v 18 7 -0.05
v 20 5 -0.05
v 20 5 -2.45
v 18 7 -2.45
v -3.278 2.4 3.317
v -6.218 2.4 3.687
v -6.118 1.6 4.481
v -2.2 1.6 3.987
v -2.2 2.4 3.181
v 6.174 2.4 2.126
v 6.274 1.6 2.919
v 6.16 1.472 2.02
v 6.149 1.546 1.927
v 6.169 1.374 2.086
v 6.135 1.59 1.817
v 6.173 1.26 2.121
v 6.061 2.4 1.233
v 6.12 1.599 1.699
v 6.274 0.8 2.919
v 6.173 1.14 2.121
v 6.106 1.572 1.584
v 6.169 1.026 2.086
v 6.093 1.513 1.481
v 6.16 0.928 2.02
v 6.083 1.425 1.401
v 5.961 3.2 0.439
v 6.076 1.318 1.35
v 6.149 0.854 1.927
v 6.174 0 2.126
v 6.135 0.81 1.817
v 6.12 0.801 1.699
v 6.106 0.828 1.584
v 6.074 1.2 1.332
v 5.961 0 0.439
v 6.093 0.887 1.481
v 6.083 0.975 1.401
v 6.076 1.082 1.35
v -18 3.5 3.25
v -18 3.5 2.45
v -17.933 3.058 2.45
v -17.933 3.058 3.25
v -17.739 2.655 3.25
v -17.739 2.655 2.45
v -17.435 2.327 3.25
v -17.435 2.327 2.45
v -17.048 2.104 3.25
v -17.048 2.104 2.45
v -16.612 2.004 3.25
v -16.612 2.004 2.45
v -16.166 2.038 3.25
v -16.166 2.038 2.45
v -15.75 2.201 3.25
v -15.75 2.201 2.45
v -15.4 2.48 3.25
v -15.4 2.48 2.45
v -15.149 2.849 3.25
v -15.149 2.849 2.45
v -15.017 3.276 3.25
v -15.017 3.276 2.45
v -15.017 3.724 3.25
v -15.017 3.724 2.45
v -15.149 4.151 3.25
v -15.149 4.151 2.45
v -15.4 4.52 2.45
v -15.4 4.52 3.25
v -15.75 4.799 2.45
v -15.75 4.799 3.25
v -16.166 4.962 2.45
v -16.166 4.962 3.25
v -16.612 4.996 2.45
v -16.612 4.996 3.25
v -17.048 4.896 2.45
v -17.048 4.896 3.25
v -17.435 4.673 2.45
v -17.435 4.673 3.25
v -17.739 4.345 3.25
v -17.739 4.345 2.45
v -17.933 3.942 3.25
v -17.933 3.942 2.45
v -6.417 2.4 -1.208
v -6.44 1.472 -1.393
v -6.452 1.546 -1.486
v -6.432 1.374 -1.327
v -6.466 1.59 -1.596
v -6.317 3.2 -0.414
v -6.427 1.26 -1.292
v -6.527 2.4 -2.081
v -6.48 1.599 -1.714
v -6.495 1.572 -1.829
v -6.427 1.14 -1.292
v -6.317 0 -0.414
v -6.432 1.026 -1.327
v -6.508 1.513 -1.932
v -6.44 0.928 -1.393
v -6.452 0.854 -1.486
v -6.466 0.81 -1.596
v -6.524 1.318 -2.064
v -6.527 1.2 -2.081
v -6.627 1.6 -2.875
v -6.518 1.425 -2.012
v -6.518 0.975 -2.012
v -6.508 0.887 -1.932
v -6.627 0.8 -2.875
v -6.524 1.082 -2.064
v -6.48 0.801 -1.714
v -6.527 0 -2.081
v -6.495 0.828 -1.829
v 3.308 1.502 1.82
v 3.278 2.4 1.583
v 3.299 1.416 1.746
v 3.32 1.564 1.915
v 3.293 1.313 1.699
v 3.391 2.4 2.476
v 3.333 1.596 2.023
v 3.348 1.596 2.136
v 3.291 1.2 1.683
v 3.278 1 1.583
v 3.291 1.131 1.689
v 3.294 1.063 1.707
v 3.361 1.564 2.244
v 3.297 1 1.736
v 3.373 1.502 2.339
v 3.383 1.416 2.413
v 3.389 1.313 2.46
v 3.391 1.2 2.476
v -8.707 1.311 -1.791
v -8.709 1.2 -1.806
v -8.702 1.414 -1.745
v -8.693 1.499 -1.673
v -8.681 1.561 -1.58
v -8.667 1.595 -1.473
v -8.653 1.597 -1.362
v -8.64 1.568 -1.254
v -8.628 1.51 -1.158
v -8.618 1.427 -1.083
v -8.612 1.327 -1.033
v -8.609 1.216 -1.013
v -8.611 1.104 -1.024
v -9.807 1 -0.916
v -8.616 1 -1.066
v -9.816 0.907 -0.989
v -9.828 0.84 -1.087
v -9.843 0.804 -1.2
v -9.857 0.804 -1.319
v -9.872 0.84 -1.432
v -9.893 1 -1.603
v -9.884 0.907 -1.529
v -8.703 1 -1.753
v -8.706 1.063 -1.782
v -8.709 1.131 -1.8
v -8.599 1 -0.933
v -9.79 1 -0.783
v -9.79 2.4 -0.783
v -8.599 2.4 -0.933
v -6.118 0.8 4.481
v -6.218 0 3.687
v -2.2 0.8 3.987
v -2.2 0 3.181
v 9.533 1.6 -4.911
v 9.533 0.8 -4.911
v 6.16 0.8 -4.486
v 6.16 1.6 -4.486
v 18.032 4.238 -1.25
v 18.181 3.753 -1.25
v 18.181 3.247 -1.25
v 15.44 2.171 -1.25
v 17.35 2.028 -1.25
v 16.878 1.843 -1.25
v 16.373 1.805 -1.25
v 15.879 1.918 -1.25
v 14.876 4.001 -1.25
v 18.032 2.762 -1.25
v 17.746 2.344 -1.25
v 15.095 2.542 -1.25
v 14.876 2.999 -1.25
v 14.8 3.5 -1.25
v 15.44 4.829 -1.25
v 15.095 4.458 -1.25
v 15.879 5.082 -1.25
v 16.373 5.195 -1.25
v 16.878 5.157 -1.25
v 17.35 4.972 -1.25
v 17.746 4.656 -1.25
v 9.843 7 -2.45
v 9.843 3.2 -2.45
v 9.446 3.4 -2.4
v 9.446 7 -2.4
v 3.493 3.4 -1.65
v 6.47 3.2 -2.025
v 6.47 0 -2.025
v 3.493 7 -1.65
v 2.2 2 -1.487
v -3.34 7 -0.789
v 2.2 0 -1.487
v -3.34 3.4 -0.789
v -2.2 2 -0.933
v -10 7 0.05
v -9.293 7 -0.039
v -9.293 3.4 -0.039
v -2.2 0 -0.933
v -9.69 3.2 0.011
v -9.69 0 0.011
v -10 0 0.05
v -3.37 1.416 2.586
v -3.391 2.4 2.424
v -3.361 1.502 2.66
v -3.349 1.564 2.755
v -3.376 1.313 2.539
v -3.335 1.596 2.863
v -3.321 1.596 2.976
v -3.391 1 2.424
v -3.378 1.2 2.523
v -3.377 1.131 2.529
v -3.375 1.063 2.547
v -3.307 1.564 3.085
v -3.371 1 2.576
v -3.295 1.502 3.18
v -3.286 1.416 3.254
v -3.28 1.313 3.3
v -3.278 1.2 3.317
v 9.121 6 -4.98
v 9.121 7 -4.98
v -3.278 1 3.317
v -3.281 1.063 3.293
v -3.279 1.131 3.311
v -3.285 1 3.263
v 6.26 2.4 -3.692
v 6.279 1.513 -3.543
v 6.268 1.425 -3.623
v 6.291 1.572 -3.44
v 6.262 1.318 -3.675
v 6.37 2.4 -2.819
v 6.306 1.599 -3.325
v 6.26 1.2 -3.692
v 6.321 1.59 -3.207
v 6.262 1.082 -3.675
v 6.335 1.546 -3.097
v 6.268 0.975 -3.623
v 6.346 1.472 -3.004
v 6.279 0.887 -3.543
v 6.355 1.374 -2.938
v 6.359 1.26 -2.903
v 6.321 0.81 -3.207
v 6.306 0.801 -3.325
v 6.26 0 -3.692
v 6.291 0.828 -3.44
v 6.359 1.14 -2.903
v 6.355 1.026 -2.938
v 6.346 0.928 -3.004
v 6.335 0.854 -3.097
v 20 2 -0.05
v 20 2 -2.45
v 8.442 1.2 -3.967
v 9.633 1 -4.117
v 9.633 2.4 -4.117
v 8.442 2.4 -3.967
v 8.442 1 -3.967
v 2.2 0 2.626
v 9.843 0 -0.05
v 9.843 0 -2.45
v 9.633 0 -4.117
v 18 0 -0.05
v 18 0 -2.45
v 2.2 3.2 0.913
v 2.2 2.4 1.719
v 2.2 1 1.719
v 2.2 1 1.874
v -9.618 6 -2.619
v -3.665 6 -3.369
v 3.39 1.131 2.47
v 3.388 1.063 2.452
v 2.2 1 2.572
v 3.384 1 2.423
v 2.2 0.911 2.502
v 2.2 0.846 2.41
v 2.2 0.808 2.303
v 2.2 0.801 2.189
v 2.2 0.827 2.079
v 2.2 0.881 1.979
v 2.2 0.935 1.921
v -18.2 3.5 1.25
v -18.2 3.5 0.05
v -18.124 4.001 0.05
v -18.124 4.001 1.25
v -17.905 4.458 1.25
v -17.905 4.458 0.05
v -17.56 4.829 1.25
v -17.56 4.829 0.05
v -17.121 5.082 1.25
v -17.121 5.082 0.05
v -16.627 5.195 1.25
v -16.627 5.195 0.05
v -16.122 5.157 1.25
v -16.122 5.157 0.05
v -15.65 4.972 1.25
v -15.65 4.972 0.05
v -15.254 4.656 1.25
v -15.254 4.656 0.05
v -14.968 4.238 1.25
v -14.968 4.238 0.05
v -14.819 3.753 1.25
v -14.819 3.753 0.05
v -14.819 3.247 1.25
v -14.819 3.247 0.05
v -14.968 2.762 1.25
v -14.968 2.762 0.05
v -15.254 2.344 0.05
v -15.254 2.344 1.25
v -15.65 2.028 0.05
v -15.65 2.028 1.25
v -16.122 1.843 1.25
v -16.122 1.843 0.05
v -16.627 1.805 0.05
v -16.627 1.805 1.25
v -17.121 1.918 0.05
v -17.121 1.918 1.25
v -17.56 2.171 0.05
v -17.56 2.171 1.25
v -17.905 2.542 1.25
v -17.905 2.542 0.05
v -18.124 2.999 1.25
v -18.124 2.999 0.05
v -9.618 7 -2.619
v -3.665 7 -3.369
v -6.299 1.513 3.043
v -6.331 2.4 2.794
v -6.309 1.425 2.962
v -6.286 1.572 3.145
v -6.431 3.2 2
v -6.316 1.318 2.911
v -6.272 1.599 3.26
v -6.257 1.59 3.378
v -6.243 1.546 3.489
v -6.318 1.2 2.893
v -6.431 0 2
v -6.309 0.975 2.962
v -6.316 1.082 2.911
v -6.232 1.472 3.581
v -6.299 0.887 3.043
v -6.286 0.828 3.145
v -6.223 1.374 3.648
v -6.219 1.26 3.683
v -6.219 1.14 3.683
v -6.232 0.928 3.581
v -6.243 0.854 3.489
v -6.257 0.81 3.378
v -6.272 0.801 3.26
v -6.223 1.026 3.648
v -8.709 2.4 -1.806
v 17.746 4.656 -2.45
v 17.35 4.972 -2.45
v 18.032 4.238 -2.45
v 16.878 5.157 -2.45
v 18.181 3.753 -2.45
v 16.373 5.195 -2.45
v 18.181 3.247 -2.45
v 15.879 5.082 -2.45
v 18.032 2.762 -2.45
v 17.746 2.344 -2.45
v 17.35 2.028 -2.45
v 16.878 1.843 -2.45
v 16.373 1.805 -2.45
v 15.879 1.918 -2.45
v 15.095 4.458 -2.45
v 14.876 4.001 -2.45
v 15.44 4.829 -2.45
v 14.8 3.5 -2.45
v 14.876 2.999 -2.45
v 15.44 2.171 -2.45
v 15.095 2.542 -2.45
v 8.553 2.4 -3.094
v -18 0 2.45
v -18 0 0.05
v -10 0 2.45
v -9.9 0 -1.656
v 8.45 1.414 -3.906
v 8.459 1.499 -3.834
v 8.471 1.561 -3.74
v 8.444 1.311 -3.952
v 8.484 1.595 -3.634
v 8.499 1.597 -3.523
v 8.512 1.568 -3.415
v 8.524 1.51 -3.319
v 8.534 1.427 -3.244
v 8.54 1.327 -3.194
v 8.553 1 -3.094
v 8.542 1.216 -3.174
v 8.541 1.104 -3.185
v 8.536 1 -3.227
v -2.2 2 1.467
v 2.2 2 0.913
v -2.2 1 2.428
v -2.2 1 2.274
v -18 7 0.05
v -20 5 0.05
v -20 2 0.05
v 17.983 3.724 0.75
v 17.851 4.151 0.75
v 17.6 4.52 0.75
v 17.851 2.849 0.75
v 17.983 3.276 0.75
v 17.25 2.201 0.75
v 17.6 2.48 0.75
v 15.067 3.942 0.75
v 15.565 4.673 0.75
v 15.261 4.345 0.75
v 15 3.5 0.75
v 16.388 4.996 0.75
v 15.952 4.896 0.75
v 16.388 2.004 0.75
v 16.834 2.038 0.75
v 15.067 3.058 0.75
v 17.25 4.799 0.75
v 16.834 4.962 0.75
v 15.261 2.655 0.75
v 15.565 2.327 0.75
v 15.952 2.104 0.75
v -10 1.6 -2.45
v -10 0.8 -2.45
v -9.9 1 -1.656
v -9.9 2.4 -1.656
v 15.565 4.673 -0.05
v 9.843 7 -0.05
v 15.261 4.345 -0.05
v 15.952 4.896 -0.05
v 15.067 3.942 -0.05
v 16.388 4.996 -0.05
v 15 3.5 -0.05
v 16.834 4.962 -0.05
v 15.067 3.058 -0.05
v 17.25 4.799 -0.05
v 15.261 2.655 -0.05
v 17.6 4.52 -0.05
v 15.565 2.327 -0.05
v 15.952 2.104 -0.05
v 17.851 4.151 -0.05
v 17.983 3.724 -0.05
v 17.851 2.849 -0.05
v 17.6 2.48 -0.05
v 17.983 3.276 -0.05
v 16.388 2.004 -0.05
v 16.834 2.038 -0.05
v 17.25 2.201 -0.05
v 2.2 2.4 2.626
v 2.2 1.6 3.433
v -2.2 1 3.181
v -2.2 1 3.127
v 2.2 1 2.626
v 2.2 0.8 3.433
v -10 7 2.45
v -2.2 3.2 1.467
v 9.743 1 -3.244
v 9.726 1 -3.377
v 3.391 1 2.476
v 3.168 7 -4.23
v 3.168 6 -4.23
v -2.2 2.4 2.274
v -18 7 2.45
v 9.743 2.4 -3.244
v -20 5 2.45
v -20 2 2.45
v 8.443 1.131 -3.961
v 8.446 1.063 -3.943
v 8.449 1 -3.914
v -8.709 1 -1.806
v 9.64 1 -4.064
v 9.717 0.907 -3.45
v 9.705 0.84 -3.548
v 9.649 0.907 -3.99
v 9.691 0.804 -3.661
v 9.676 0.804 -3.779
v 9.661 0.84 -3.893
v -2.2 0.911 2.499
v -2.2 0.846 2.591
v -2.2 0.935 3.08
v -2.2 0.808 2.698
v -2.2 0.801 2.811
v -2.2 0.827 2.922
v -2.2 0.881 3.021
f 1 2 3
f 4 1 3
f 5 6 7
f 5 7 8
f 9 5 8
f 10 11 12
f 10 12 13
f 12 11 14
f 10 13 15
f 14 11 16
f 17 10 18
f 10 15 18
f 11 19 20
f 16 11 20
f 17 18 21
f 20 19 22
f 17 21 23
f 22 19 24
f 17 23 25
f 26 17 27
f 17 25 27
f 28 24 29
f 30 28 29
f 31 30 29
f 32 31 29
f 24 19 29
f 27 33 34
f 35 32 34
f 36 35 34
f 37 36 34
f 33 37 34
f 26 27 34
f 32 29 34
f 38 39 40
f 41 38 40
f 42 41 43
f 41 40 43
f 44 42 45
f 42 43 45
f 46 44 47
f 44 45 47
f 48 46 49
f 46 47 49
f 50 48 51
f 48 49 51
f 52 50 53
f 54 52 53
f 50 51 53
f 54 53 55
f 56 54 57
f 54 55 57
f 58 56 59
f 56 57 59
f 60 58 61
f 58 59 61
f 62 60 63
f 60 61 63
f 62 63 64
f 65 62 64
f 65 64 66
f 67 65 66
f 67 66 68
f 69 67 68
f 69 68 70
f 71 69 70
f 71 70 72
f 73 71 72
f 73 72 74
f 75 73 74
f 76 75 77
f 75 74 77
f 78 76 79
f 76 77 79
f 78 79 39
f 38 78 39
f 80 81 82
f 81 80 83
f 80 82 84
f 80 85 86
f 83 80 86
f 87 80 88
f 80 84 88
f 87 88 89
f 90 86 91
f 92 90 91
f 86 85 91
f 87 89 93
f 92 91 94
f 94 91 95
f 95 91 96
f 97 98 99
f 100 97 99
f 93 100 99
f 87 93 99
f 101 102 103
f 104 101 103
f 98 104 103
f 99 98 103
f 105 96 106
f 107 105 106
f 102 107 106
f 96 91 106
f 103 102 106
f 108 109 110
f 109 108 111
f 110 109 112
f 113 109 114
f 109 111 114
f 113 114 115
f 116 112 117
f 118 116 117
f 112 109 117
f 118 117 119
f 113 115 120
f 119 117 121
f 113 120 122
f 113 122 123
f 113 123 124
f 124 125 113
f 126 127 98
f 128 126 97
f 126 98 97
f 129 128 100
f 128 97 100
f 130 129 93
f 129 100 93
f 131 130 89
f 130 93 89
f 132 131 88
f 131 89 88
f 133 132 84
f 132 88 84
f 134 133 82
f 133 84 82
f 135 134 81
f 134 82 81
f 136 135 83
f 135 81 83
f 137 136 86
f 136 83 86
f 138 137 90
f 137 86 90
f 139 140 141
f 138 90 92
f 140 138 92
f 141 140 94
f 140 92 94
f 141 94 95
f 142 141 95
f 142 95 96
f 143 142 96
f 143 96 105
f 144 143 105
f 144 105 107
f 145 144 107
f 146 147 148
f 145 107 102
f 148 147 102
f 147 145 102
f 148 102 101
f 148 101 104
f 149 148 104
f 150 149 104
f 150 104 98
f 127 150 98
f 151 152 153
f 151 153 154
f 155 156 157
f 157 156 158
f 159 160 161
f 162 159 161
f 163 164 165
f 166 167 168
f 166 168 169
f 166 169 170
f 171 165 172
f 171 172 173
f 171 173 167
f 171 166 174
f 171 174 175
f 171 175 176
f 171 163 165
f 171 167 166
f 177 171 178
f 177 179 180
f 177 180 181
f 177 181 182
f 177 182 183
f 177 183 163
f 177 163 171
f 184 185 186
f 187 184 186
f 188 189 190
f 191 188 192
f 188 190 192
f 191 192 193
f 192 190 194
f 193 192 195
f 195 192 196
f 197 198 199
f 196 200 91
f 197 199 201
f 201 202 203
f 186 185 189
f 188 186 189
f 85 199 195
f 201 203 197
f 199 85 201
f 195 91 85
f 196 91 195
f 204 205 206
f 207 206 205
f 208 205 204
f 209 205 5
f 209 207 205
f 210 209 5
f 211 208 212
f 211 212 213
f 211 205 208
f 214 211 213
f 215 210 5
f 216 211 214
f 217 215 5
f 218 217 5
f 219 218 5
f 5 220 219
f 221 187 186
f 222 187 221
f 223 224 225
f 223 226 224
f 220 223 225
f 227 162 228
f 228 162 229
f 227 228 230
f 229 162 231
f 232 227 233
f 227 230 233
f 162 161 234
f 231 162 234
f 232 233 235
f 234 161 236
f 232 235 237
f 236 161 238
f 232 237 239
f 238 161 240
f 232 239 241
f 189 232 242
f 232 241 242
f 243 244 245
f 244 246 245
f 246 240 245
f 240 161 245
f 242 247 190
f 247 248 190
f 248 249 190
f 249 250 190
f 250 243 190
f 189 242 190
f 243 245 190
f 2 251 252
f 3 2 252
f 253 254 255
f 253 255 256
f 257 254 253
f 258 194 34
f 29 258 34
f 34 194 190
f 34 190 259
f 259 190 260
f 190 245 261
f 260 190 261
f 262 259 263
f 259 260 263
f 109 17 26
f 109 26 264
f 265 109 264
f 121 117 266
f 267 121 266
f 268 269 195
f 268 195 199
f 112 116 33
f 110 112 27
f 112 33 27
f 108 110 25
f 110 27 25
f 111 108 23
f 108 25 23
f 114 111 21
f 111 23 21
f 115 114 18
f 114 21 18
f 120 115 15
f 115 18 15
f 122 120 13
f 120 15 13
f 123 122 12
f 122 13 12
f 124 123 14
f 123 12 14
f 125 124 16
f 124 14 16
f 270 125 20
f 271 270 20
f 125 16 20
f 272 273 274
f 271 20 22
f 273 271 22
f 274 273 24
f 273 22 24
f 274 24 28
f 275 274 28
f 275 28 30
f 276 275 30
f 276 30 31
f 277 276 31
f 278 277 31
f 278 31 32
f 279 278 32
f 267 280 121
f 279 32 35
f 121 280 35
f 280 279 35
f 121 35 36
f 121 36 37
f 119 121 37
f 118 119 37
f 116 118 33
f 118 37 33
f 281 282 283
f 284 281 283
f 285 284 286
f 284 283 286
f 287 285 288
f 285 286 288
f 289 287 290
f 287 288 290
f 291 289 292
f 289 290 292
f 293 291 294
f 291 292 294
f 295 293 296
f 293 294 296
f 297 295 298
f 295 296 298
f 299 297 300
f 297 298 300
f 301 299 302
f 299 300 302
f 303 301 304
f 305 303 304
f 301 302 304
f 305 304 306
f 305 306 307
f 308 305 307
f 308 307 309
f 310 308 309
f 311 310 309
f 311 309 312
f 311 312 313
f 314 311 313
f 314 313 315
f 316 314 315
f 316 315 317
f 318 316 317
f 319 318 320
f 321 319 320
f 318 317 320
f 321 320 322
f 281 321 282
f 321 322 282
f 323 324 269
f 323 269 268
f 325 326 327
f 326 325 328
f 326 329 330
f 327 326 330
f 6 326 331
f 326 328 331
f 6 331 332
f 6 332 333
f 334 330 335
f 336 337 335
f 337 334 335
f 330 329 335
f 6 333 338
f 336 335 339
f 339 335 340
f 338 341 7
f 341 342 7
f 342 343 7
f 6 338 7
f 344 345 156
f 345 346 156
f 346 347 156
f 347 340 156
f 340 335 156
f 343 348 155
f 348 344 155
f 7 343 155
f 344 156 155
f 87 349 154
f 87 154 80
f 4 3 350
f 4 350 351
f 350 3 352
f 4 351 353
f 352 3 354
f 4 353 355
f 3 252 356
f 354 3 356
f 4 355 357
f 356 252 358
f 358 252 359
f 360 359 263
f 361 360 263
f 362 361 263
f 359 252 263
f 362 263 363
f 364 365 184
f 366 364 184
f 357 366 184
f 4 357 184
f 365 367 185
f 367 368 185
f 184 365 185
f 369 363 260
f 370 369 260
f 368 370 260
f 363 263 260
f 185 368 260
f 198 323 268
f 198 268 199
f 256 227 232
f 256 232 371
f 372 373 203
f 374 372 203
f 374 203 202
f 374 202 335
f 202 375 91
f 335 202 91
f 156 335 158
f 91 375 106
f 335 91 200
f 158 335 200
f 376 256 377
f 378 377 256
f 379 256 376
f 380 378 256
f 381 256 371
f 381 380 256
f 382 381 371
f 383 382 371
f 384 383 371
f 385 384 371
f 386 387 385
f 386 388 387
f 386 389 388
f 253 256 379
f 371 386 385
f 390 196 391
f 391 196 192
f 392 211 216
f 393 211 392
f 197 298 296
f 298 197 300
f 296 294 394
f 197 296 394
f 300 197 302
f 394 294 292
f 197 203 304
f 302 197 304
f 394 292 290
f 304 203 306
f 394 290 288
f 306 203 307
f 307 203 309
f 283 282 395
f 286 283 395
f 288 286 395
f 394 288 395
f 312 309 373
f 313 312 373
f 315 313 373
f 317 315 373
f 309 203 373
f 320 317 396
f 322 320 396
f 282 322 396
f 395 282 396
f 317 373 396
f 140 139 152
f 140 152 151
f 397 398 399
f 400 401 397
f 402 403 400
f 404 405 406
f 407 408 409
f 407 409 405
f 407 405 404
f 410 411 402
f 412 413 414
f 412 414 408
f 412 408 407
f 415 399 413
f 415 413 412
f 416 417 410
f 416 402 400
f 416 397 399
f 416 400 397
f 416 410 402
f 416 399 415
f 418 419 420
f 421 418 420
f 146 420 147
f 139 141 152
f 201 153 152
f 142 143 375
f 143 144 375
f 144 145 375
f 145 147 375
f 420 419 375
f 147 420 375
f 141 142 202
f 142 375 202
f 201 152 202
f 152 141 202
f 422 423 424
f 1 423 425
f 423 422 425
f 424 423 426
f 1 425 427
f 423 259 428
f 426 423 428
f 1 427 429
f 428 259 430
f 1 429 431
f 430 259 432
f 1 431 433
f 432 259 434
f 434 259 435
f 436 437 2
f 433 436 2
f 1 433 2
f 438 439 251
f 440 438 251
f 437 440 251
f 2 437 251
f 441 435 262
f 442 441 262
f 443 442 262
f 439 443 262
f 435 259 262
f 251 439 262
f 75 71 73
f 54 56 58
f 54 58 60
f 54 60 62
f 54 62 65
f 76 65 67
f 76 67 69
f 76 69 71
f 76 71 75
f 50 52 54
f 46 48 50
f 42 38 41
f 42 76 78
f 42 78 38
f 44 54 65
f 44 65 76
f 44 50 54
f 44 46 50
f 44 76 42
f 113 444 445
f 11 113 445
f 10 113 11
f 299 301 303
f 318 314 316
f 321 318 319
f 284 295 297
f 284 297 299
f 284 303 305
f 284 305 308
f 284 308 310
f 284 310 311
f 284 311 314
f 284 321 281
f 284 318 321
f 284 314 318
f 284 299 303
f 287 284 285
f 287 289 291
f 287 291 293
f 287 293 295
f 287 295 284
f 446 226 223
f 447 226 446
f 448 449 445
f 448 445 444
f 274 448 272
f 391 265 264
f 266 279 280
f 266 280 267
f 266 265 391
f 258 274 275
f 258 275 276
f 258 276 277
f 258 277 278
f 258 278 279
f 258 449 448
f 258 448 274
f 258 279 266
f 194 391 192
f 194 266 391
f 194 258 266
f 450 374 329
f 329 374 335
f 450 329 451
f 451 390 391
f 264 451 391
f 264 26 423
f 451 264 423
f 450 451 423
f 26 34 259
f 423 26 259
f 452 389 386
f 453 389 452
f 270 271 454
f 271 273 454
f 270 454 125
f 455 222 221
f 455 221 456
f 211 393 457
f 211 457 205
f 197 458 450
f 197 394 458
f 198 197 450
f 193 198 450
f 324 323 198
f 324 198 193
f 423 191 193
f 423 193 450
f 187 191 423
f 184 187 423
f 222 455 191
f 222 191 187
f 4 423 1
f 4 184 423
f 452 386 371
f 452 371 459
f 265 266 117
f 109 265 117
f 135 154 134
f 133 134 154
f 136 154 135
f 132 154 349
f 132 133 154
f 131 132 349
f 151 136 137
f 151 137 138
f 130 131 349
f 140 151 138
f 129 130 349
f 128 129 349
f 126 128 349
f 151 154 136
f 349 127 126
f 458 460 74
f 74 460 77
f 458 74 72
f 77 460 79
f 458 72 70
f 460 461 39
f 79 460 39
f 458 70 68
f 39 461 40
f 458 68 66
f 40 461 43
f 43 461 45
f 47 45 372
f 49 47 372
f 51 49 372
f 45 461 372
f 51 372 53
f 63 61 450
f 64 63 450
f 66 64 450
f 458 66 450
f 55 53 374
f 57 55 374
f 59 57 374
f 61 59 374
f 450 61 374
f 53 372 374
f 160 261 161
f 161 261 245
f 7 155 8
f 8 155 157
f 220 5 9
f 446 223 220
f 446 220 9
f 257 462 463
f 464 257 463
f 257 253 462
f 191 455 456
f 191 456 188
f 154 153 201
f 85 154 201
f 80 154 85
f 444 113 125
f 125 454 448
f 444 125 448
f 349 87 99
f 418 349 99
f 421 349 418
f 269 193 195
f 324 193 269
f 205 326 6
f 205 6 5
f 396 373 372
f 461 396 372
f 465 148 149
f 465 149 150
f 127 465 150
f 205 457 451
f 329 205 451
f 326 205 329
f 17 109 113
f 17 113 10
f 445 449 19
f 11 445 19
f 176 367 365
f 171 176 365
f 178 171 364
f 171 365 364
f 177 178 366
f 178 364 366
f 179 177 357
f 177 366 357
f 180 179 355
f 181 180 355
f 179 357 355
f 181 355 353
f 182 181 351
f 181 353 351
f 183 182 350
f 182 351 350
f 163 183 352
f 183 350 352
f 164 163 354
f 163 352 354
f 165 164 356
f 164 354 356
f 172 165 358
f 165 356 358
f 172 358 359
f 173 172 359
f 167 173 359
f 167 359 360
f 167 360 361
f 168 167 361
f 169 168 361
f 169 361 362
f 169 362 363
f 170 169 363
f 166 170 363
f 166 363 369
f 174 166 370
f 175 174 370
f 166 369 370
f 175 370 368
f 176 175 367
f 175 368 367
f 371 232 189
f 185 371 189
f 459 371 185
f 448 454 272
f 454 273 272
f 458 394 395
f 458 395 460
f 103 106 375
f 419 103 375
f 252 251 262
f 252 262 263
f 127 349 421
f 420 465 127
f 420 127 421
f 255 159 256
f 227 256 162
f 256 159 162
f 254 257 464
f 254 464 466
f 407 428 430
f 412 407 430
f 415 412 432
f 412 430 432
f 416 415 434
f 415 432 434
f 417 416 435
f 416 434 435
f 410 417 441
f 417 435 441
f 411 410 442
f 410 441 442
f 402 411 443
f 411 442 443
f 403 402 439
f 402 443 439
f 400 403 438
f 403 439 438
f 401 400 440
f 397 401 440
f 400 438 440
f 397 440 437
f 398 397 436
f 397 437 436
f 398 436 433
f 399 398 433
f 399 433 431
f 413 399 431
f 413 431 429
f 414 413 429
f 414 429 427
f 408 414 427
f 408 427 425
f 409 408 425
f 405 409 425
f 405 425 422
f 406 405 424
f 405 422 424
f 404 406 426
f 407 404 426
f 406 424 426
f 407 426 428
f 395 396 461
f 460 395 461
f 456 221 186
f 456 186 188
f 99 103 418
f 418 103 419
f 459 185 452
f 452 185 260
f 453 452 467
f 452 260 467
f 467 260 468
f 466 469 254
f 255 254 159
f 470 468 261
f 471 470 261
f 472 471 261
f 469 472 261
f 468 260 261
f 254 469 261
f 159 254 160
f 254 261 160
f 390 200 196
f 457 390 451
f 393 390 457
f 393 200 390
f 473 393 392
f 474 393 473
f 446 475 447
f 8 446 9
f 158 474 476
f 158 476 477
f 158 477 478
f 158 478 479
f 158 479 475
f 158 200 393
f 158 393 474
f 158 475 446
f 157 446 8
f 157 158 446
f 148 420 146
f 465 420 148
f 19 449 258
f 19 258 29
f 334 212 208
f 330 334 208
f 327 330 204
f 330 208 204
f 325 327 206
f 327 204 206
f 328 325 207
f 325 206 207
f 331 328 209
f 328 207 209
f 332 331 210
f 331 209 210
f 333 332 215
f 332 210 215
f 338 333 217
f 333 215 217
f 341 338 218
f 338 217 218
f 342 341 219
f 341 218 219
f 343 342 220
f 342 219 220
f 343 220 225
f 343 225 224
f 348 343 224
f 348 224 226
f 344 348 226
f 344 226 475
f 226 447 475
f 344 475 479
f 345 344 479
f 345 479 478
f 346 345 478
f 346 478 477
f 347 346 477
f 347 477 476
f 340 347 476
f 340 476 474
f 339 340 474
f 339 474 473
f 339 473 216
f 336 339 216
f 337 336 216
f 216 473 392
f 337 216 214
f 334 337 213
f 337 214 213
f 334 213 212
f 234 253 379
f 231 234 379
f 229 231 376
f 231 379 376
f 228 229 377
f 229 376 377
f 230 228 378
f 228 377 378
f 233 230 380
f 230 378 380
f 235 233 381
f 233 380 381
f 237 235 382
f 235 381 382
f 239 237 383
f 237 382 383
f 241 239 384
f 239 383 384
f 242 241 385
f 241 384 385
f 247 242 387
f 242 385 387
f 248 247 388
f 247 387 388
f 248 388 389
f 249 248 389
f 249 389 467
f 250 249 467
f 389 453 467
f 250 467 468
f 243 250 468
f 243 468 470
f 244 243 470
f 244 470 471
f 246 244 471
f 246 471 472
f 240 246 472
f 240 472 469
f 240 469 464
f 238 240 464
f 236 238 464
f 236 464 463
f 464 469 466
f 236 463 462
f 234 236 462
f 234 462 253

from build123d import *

# Parameters (mm, degrees)
BOSS_EXTRUDE4_DEPTH      = 2.4
BOSS_EXTRUDE4_2_DEPTH    = 2.4
BOSS_EXTRUDE4_3_DEPTH    = 2.4
BOSS_EXTRUDE4_4_DEPTH    = 2.4
BOSS_EXTRUDE5_DEPTH      = 7
SKETCH2_R                = 1.499999999999997
BOSS_EXTRUDE8_DEPTH      = 0.8
SKETCH3_R                = 1.5000000000000007
BOSS_EXTRUDE9_DEPTH      = 0.8
SKETCH4_R                = 1.6999999999999995
CUT_EXTRUDE3_DEPTH       = 1.2
SKETCH5_R                = 1.6999999999999995
CUT_EXTRUDE4_DEPTH       = 1.2
CHAMFER4_SIZE            = 2
CUT_EXTRUDE7_REACH       = 33.329
SKETCH8_R                = 0.3999999999999905
SKETCH8_R_2              = 0.4000000000000032
CUT_EXTRUDE10_DEPTH      = 2
CHAMFER6_SIZE            = 0.8
CUT_EXTRUDE11_DEPTH      = 10
CUT_EXTRUDE11_DEPTH_BACK = 1.4
BOSS_EXTRUDE10_DEPTH     = 3.6
CHAMFER8_SIZE            = 2.6


with BuildPart() as part:
    # Sketch1 → Boss-Extrude4 (new body)
    with BuildSketch(Plane(origin=(0, 0, 0), x_dir=(1, 0, 0), z_dir=(0, 1, 0))):
        Polygon((-6.430686748297487, -2.000308799271804), (-6.118186748297487, -4.480700653394857), (-2.1999999999999993, -3.9870555235708633), (-2.1999999999999997, -1.4672923701760037), align=None)
    extrude(amount=BOSS_EXTRUDE4_DEPTH)



with BuildPart() as body_2:
    # Sketch1 → Boss-Extrude4 2 (new body)
    with BuildSketch(Plane(origin=(0, 0, 0), x_dir=(1, 0, 0), z_dir=(0, 1, 0))):
        Polygon((-10.000000000000064, 2.4499999999999993), (-9.689951018234682, -0.01093750000000027), (-6.316618096627332, 0.41406249999999967), (-6.626667078392713, 2.8750000000000004), align=None)
    extrude(amount=BOSS_EXTRUDE4_2_DEPTH)


with BuildPart() as body_3:
    # Sketch1 → Boss-Extrude4 3 (new body)
    with BuildSketch(Plane(origin=(0, 0, 0), x_dir=(1, 0, 0), z_dir=(0, 1, 0))):
        Polygon((5.961321581281771, -0.4390625000000079), (2.200000000000001, -0.9129444764291388), (2.200000000000001, -3.432707629823996), (6.273821581281774, -2.919454354123064), align=None)
    extrude(amount=BOSS_EXTRUDE4_3_DEPTH)


with BuildPart() as body_4:
    # Sketch1 → Boss-Extrude4 4 (new body)
    with BuildSketch(Plane(origin=(0, 0, 0), x_dir=(1, 0, 0), z_dir=(0, 1, 0))):
        Polygon((6.159752929611616, 4.485937500000006), (6.469801911377001, 2.025000000000001), (9.843134832984354, 2.4499999999999993), (9.533085851218969, 4.910937500000012), align=None)
    extrude(amount=BOSS_EXTRUDE4_4_DEPTH)


with BuildPart() as part_1:
    add(part.part)

    add(body_2.part)  # Boss-Extrude5 merges body 2

    add(body_3.part)  # Boss-Extrude5 merges body 3

    add(body_4.part)  # Boss-Extrude5 merges body 4
    # Sketch1<8> → Boss-Extrude5 (add)
    with BuildSketch(Plane(origin=(0, 0, 0), x_dir=(1, 0, 0), z_dir=(0, 1, 0))):
        Polygon((-20, -0.05000000000000027), (-20, -2.45), (-12, -2.4499999999999997), (-10.000000000000064, -2.4499999999999997), (-6.430686748297488, -2.000308799271796), (-2.5125, -1.5066636694477982), (-2.1999999999999993, -1.467292370176004), (-2.1999999999999997, 0.9327076298239989), (-6.316618096627332, 0.41406249999999967), (-9.689951018234682, -0.01093750000000025), (-10.000000000000064, -0.05000000000000029), (-12, -0.05000000000000027), align=None)
        Polygon((2.2000000000000006, 1.487055523570866), (2.2000000000000006, -0.9129444764291423), (5.961321581281771, -0.4390625000000079), (9.687500000000064, 0.03039185412306233), (9.843134832984425, 0.05000000000000027), (12, 0.05000000000000013), (20, 0.05000000000000013), (20, 2.4499999999999997), (12, 2.4499999999999993), (9.843134832984353, 2.4499999999999993), (6.469801911376997, 2.024999999999999), (2.510048981765383, 1.526118023570866), align=None)
        Polygon((-2.1999999999999997, 0.9327076298239989), (-2.1999999999999997, -1.4672923701760037), (2.200000000000001, -0.9129444764291388), (2.2000000000000006, 1.487055523570866), align=None)
    extrude(amount=BOSS_EXTRUDE5_DEPTH)

    # Sketch2 → Boss-Extrude8 (add)
    with BuildSketch(Plane.XY.offset(2.4499999999999993)):
        with Locations(Location((-16.5, 3.4999999999999996, 0), (0, 0, 180))):
            Circle(SKETCH2_R)
    extrude(amount=BOSS_EXTRUDE8_DEPTH)

    # Sketch3 → Boss-Extrude9 (add)
    with BuildSketch(Plane.XY.offset(-0.05000000000000013)):
        with Locations(Location((16.5, 3.4999999999999996, 0), (0, 0, 180))):
            Circle(SKETCH3_R)
    extrude(amount=BOSS_EXTRUDE9_DEPTH)

    # Sketch4 → Cut-Extrude3 (cut)
    with BuildSketch(Plane(origin=(0, 0, 0.05000000000000041), x_dir=(-1, 0, -5e-17), z_dir=(5e-17, 0, -1))):
        with Locations((16.5, 3.4999999999999996)):
            Circle(SKETCH4_R)
    extrude(amount=-CUT_EXTRUDE3_DEPTH, mode=Mode.SUBTRACT)

    # Sketch5 → Cut-Extrude4 (cut)
    with BuildSketch(Plane(origin=(-1e-16, 0, -2.449999999999999), x_dir=(-1, 0, 5e-17), z_dir=(-5e-17, 0, -1))):
        with Locations((-16.5, 3.4999999999999996)):
            Circle(SKETCH5_R)
    extrude(amount=-CUT_EXTRUDE4_DEPTH, mode=Mode.SUBTRACT)

    # Chamfer4
    chamfer4_edges = [part_1.edges().sort_by_distance(p)[0] for p in [
        (20, 7, -1.25),
        (-20, 7, 1.2500000000000002),
        (-20, 0, 1.2500000000000002),
        (20, 0, -1.25),
    ]]
    chamfer(chamfer4_edges, length=CHAMFER4_SIZE)

    # Cut-Extrude7: up to this face of the body (flat: up to its plane)
    cut_extrude7_end = Plane(part_1.part.faces().sort_by_distance((-9.844975509, 1.2, -1.21953125))[0])
    # Sketch8 → Cut-Extrude7 (cut, up to the picked face)
    with BuildSketch(Plane(origin=(9.99318385334905, 0, -1.2590228229384695), x_dir=(-0.12500000000000053, 0, -0.9921567416492215), z_dir=(0.9921567416492215, 0, -0.12500000000000053)), mode=Mode.PRIVATE) as cut_extrude7_sk1:
        with Locations((2.4807840170405906, 1.2000000000000017)):
            Circle(SKETCH8_R)
    cut_extrude7_tool1 = split(extrude(cut_extrude7_sk1.sketch, amount=-CUT_EXTRUDE7_REACH, mode=Mode.PRIVATE), bisect_by=cut_extrude7_end, keep=Keep.BOTH, mode=Mode.PRIVATE)
    # Sketch8 → Cut-Extrude7 (cut, up to the picked face)
    with BuildSketch(Plane(origin=(9.99318385334905, 0, -1.2590228229384695), x_dir=(-0.12500000000000053, 0, -0.9921567416492215), z_dir=(0.9921567416492215, 0, -0.12500000000000053)), mode=Mode.PRIVATE) as cut_extrude7_sk2:
        with Locations((-2.4807840170405973, 1.200000000000001)):
            Circle(SKETCH8_R_2)
    cut_extrude7_tool2 = split(extrude(cut_extrude7_sk2.sketch, amount=-CUT_EXTRUDE7_REACH, mode=Mode.PRIVATE), bisect_by=cut_extrude7_end, keep=Keep.BOTH, mode=Mode.PRIVATE)
    add(cut_extrude7_tool1.solids().sort_by(Axis((9.683086, 1.2, -3.720349), (-0.9921567416492215, 0, 0.12500000000000053)))[0], mode=Mode.SUBTRACT)
    add(cut_extrude7_tool2.solids().sort_by(Axis((10.303282, 1.2, 1.202304), (-0.9921567416492215, 0, 0.12500000000000053)))[0], mode=Mode.SUBTRACT)

    # Sketch1<10> → Cut-Extrude10 (cut)
    with BuildSketch(Plane(origin=(0, 0, 0), x_dir=(1, 0, 0), z_dir=(0, 1, 0))):
        Polygon((-2.1999999999999997, 0.9327076298239989), (-2.1999999999999997, -1.4672923701760037), (2.200000000000001, -0.9129444764291388), (2.2000000000000006, 1.487055523570866), align=None)
        Polygon((-2.2, 3.432707629823986), (-2.1999999999999997, 0.9327076298239989), (2.200000000000001, 1.487055523570866), (2.2, 3.987055523570867), align=None)
        Polygon((2.200000000000001, -0.9129444764291388), (-2.1999999999999993, -1.467292370176004), (-2.1999999999999993, -3.9870555235708607), (2.200000000000003, -3.432707629823997), align=None)
    extrude(amount=CUT_EXTRUDE10_DEPTH, mode=Mode.SUBTRACT)

    # Chamfer6
    chamfer6_edges = [part_1.edges().sort_by_distance(p)[0] for p in [
        (4.080660790640886, 2.4, 0.6760034882145733),
        (-4.315343374148743, 2.4, 1.7338005847239037),
        (-4.159093374148743, 0, 4.233878088482863),
        (-4.159093374148743, 2.4, 4.233878088482863),
        (7.846419390415299, 2.4, -4.698437499999993),
        (8.156468372180676, 2.4, -2.237499999999999),
        (7.846419390415299, 0, -4.698437499999993),
        (4.236910790640888, 2.4, 3.1760809919735298),
        (-8.313333539196389, 2.4, -2.6624999999999988),
        (-8.003284557431007, 2.4, -0.20156249999999976),
        (-8.313333539196389, 0, -2.6624999999999988),
        (4.236910790640888, 0, 3.1760809919735298),
    ]]
    chamfer(chamfer6_edges, length=CHAMFER6_SIZE)

    # Sketch9 → Cut-Extrude11 (cut, two sides: drawn at the far end of the back side and taken through both)
    with BuildSketch(Plane(origin=(0, 2.4, 0), x_dir=(1, 0, 0), z_dir=(0, 1, 0)).offset(-CUT_EXTRUDE11_DEPTH_BACK)):
        Polygon((-9.900000000000063, 1.6562746066806198), (-9.789951018234682, 0.7827878933193786), (-8.599362928255616, 0.9327878933193787), (-8.709411910020998, 1.8062746066806201), align=None)
        Polygon((-2.1999999999999993, -2.2736165792623466), (-3.390588089979065, -2.423616579262345), (-3.2780880899790614, -3.3165576467466713), (-2.087499999999996, -3.1665576467466714), align=None)
        Polygon((2.200000000000001, -2.626383420737649), (2.087499999999998, -1.733442353253328), (3.278088089979064, -1.5834423532533284), (3.3905880899790666, -2.47638342073765), align=None)
        Polygon((9.633085851218974, 4.117212106680604), (8.442497761239908, 3.967212106680604), (8.552546743005287, 3.0937253933193816), (9.743134832984353, 3.2437253933193815), align=None)
    extrude(amount=CUT_EXTRUDE11_DEPTH + CUT_EXTRUDE11_DEPTH_BACK, mode=Mode.SUBTRACT)

    # Sketch10 → Boss-Extrude10 (add)
    with BuildSketch(Plane(origin=(0, 6.999999999999999, 0), x_dir=(1, 0, 0), z_dir=(0, 1, 0))):
        Polygon((9.121272136324666, 4.979607528287985), (3.168331686429335, 4.22960752828798), (3.493331686429336, 1.6499999999999986), (9.446272136324666, 2.4000000000000035), align=None)
        Polygon((-9.618088321575, 2.6186700282879727), (-9.293088321574997, 0.03906249999999938), (-3.3401478716796675, 0.7890624999999998), (-3.665147871679668, 3.3686700282879767), align=None)
    extrude(amount=-BOSS_EXTRUDE10_DEPTH)

    # Chamfer8
    chamfer8_edges = [part_1.edges().sort_by_distance(p)[0] for p in [
        (-6.641618096627334, 3.399999999999999, -2.9936700282879745),
        (6.144801911377001, 3.399999999999999, -4.604607528287982),
    ]]
    chamfer(chamfer8_edges, length=CHAMFER8_SIZE - 0.0001)  # a hair under: the kernel refuses the full size


solid = part_1.part
